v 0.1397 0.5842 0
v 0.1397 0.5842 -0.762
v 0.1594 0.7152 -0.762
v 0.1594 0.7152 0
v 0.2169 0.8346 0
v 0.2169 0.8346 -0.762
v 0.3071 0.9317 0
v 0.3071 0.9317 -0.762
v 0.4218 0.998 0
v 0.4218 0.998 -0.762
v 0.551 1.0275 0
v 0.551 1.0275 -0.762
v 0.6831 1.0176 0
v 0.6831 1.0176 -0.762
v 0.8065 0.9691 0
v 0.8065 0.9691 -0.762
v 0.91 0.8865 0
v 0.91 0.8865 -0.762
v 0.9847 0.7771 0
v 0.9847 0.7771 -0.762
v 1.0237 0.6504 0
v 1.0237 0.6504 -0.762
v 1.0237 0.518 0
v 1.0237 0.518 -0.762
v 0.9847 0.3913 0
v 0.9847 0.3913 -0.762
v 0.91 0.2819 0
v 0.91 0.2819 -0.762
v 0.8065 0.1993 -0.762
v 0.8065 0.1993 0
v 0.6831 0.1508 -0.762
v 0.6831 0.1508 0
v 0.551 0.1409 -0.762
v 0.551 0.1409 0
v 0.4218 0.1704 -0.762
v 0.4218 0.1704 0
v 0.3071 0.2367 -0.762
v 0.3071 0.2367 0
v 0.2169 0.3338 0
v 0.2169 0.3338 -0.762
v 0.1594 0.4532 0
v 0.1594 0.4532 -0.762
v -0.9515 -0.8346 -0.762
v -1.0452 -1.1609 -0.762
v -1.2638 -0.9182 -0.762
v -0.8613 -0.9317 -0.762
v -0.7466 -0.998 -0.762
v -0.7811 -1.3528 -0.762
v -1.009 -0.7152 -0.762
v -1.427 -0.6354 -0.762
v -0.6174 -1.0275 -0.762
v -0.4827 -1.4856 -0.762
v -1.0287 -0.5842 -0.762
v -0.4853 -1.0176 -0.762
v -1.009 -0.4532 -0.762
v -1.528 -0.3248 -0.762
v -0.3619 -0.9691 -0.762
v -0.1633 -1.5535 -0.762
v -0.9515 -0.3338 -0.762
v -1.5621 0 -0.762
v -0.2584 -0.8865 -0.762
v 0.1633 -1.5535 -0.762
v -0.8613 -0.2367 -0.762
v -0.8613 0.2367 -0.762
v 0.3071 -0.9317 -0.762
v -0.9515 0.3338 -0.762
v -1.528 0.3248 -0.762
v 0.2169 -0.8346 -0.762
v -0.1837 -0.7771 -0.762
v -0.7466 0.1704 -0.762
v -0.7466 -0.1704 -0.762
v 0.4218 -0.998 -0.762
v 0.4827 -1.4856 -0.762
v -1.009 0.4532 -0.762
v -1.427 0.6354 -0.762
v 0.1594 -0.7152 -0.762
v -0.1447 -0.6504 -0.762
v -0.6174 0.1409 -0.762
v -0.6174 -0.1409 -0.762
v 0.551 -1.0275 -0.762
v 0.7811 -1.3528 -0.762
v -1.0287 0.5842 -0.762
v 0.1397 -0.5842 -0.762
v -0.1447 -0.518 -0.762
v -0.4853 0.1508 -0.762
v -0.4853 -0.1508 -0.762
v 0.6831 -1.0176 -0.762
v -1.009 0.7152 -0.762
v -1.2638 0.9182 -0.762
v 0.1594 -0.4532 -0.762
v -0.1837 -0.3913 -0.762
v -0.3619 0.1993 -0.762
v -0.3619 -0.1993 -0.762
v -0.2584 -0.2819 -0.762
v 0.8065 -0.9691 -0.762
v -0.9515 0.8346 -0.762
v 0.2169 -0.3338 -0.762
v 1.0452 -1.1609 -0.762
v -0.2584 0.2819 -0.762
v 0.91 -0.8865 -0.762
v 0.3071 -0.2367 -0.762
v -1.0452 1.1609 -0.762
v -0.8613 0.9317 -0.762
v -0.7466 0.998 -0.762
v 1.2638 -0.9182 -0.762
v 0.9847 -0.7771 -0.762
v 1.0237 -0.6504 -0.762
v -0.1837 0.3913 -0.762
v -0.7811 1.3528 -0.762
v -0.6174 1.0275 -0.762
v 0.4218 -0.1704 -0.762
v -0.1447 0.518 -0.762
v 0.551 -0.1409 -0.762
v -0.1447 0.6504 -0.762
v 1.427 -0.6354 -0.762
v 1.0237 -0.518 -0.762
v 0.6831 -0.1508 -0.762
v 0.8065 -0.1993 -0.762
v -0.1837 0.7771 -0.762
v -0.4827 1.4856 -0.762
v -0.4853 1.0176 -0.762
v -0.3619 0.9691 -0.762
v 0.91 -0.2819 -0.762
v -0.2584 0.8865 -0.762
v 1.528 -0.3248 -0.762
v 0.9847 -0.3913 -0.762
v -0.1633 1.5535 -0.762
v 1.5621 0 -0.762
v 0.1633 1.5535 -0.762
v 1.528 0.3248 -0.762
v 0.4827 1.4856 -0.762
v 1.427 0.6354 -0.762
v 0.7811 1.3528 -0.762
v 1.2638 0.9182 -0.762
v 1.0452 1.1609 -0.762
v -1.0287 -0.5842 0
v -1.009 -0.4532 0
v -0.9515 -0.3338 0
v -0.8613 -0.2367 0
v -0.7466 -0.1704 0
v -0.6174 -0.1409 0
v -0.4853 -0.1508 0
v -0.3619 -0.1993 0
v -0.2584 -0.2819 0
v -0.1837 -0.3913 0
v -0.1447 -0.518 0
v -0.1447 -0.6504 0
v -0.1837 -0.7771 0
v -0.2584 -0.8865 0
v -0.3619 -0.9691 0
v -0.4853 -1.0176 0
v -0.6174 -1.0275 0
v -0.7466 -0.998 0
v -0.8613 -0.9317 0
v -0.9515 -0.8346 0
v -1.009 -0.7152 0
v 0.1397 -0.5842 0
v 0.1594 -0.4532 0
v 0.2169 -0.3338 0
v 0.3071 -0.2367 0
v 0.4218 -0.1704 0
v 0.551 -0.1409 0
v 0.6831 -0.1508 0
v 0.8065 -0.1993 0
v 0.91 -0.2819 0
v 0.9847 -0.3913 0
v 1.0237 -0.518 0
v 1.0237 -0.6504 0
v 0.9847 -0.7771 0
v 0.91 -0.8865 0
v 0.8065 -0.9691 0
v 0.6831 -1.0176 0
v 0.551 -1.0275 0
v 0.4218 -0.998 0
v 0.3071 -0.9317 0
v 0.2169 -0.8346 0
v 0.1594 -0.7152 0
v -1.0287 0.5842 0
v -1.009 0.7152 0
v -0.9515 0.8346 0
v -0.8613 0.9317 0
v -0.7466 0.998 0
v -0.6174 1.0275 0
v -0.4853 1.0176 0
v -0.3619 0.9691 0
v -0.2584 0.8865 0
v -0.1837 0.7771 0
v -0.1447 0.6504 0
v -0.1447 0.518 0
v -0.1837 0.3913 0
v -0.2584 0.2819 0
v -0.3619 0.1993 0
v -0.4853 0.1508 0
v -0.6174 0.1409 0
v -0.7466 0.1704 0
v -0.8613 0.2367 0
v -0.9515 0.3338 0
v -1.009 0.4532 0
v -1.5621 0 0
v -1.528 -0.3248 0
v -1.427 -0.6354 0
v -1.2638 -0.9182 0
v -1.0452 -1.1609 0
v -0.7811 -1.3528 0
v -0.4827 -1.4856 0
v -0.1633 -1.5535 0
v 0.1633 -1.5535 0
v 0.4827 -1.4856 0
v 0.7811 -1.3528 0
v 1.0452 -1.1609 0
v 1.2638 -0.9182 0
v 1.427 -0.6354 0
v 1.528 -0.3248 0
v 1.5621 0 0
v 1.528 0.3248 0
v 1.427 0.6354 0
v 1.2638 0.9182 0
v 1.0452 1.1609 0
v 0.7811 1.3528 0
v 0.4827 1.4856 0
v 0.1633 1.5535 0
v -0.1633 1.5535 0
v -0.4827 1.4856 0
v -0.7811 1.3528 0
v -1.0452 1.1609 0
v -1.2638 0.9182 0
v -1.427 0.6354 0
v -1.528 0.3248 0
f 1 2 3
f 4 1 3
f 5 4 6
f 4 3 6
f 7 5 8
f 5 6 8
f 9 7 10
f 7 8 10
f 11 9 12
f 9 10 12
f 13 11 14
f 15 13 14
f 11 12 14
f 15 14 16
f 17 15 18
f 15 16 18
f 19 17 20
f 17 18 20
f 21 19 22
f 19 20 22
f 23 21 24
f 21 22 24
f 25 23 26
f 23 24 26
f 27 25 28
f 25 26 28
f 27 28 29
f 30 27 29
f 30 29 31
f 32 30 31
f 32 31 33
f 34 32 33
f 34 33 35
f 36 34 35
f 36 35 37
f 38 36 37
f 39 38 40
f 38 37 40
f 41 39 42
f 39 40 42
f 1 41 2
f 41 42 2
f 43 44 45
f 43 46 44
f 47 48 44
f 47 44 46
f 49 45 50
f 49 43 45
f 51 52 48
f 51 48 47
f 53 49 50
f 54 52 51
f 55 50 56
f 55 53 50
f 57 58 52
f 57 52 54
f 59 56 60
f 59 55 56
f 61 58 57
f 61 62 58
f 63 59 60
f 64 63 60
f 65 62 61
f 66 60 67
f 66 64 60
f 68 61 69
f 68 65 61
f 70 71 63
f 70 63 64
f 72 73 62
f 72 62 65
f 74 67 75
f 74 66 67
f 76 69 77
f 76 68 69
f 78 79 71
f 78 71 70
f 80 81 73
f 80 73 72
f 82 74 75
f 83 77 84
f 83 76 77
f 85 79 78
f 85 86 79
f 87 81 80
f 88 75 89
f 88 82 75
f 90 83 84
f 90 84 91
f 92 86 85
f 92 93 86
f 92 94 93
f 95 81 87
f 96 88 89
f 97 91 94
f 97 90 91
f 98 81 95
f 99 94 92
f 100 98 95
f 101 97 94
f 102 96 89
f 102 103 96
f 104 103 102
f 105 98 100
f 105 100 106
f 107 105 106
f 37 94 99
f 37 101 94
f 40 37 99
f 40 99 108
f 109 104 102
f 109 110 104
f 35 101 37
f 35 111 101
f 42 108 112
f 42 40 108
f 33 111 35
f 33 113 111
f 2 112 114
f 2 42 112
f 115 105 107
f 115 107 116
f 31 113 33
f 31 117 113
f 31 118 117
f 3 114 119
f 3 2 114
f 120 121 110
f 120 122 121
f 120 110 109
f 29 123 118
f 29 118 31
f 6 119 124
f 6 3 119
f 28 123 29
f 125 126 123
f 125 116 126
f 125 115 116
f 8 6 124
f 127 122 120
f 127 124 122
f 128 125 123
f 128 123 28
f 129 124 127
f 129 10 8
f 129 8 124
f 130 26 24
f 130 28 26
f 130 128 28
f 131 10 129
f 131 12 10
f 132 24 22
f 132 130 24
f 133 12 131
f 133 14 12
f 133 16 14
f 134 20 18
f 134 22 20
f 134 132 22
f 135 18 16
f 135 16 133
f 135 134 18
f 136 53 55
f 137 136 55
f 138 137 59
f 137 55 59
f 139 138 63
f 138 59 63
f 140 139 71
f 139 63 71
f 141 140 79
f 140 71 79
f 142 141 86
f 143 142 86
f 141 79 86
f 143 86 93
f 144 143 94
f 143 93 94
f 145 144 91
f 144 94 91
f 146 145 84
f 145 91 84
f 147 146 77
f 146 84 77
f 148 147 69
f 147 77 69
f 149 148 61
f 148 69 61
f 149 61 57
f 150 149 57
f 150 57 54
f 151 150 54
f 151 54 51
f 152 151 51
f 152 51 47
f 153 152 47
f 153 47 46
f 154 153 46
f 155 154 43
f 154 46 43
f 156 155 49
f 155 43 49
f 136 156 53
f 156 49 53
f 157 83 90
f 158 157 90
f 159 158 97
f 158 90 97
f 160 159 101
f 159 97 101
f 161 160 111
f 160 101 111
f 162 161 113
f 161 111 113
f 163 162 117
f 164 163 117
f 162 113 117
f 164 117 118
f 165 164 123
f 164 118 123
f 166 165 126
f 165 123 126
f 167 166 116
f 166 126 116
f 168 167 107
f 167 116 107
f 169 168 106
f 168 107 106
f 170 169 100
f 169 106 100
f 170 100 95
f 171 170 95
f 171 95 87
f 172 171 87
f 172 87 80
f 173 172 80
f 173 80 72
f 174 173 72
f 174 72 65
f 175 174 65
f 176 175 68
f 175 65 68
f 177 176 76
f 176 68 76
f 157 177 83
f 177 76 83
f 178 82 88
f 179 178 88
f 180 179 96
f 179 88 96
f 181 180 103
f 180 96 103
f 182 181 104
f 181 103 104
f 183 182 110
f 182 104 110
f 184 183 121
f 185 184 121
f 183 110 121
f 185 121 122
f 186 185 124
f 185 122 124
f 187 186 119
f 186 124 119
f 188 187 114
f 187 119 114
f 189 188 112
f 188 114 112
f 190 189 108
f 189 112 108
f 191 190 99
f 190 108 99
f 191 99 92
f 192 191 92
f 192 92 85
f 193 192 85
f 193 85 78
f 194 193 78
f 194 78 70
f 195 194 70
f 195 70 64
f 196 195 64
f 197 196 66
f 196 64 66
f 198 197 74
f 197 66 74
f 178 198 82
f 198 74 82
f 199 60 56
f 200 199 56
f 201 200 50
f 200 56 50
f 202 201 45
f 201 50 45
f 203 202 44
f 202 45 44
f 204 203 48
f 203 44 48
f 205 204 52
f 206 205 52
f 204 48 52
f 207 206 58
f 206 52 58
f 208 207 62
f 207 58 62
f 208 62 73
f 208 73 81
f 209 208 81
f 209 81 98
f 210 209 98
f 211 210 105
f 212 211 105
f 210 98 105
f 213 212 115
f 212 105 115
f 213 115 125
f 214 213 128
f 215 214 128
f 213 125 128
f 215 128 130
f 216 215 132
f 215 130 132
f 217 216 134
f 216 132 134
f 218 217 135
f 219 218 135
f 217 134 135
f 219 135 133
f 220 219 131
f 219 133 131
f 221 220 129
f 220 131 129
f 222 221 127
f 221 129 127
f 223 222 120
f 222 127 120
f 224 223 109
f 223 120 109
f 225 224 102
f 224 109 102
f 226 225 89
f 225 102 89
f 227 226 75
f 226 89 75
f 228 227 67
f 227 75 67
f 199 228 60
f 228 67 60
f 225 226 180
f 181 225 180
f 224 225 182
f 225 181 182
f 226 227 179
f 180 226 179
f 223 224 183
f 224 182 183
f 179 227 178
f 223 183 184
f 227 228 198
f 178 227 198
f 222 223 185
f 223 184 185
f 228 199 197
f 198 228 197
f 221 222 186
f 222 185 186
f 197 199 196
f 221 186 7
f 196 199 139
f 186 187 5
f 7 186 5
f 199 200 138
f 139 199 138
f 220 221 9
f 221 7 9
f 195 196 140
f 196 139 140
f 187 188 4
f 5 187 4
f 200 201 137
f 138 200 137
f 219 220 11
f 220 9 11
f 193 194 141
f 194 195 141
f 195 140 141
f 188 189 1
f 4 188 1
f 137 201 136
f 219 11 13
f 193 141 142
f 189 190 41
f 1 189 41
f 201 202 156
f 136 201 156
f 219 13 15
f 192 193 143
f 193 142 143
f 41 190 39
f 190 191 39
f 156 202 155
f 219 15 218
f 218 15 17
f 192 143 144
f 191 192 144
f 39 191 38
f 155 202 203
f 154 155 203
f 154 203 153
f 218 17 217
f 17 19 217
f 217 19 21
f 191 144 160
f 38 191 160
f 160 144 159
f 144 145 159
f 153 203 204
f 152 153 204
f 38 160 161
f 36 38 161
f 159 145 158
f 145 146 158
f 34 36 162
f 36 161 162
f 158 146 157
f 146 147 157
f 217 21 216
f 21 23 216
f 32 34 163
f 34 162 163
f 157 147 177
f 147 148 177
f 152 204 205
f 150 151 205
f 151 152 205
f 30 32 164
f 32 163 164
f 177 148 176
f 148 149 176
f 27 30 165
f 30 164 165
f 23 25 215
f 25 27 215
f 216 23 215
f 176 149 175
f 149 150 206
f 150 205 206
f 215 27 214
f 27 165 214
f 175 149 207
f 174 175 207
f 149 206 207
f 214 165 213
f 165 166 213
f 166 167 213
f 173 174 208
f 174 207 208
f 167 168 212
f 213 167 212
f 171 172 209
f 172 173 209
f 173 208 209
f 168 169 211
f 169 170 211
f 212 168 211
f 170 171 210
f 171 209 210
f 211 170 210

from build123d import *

# Parameters (mm, degrees)
SKETCH1_W                       = 12.7
SKETCH1_H                       = 1.5875
F_65_0_035_DIAMETER_HOLE1_D     = 0.889
F_65_0_035_DIAMETER_HOLE1_DEPTH = 9.525
F_65_0_035_DIAMETER_HOLE1_TIP   = 0.267082545
SKETCH5_W                       = 15.24
SKETCH5_H                       = 15.24
CUT_EXTRUDE1_DEPTH              = 3.81


with BuildPart() as part:
    # Sketch1 → Revolve1 (revolve)
    with BuildSketch(Plane(origin=(0, 0, 0), x_dir=(0, 0, -1), z_dir=(1, 0, 0))):
        with Locations((6.2484, 0.79375)):
            Rectangle(SKETCH1_W, SKETCH1_H)
    revolve(axis=Axis((0, 0, 0.1016), (0, 0, 1)))

    # Sketch2 → Cut-Revolve1 (revolve, cut)
    with BuildSketch(Plane(origin=(0, 0, 0), x_dir=(0, 0, -1), z_dir=(1, 0, 0)), mode=Mode.PRIVATE) as cut_revolve1_sk:
        Polygon((0, 0), (0, 1.5621), (4.4414817, 1.5621), (5.314787903, 2.435406202), (-1.432186341, 2.435406202), (-1.432186341, 0), align=None)
    revolve(cut_revolve1_sk.sketch.rotate(Axis((0, 0, 1.432186341), (0, 0, 1)), 90), axis=Axis((0, 0, 1.432186341), (0, 0, 1)), mode=Mode.SUBTRACT)

    # #65 (0.035) Diameter Hole1
    with Locations(Plane.XY):
        with Locations((0.5842, 0.5842), (-0.5842, 0.5842), (-0.5842, -0.5842), (0.5842, -0.5842)):
            Hole(F_65_0_035_DIAMETER_HOLE1_D / 2, depth=F_65_0_035_DIAMETER_HOLE1_DEPTH)
            with Locations((0, 0, -(F_65_0_035_DIAMETER_HOLE1_DEPTH + F_65_0_035_DIAMETER_HOLE1_TIP / 2))):  # 118° drill point
                Cone(0, F_65_0_035_DIAMETER_HOLE1_D / 2, F_65_0_035_DIAMETER_HOLE1_TIP, mode=Mode.SUBTRACT)

    # Sketch5 → Cut-Extrude1 (cut, symmetric)
    with BuildSketch(Plane(origin=(0, 0, 0), x_dir=(0, 0, -1), z_dir=(1, 0, 0))):
        with Locations((8.382, 0)):
            Rectangle(SKETCH5_W, SKETCH5_H)
    extrude(amount=CUT_EXTRUDE1_DEPTH, both=True, mode=Mode.SUBTRACT)


solid = part.part
